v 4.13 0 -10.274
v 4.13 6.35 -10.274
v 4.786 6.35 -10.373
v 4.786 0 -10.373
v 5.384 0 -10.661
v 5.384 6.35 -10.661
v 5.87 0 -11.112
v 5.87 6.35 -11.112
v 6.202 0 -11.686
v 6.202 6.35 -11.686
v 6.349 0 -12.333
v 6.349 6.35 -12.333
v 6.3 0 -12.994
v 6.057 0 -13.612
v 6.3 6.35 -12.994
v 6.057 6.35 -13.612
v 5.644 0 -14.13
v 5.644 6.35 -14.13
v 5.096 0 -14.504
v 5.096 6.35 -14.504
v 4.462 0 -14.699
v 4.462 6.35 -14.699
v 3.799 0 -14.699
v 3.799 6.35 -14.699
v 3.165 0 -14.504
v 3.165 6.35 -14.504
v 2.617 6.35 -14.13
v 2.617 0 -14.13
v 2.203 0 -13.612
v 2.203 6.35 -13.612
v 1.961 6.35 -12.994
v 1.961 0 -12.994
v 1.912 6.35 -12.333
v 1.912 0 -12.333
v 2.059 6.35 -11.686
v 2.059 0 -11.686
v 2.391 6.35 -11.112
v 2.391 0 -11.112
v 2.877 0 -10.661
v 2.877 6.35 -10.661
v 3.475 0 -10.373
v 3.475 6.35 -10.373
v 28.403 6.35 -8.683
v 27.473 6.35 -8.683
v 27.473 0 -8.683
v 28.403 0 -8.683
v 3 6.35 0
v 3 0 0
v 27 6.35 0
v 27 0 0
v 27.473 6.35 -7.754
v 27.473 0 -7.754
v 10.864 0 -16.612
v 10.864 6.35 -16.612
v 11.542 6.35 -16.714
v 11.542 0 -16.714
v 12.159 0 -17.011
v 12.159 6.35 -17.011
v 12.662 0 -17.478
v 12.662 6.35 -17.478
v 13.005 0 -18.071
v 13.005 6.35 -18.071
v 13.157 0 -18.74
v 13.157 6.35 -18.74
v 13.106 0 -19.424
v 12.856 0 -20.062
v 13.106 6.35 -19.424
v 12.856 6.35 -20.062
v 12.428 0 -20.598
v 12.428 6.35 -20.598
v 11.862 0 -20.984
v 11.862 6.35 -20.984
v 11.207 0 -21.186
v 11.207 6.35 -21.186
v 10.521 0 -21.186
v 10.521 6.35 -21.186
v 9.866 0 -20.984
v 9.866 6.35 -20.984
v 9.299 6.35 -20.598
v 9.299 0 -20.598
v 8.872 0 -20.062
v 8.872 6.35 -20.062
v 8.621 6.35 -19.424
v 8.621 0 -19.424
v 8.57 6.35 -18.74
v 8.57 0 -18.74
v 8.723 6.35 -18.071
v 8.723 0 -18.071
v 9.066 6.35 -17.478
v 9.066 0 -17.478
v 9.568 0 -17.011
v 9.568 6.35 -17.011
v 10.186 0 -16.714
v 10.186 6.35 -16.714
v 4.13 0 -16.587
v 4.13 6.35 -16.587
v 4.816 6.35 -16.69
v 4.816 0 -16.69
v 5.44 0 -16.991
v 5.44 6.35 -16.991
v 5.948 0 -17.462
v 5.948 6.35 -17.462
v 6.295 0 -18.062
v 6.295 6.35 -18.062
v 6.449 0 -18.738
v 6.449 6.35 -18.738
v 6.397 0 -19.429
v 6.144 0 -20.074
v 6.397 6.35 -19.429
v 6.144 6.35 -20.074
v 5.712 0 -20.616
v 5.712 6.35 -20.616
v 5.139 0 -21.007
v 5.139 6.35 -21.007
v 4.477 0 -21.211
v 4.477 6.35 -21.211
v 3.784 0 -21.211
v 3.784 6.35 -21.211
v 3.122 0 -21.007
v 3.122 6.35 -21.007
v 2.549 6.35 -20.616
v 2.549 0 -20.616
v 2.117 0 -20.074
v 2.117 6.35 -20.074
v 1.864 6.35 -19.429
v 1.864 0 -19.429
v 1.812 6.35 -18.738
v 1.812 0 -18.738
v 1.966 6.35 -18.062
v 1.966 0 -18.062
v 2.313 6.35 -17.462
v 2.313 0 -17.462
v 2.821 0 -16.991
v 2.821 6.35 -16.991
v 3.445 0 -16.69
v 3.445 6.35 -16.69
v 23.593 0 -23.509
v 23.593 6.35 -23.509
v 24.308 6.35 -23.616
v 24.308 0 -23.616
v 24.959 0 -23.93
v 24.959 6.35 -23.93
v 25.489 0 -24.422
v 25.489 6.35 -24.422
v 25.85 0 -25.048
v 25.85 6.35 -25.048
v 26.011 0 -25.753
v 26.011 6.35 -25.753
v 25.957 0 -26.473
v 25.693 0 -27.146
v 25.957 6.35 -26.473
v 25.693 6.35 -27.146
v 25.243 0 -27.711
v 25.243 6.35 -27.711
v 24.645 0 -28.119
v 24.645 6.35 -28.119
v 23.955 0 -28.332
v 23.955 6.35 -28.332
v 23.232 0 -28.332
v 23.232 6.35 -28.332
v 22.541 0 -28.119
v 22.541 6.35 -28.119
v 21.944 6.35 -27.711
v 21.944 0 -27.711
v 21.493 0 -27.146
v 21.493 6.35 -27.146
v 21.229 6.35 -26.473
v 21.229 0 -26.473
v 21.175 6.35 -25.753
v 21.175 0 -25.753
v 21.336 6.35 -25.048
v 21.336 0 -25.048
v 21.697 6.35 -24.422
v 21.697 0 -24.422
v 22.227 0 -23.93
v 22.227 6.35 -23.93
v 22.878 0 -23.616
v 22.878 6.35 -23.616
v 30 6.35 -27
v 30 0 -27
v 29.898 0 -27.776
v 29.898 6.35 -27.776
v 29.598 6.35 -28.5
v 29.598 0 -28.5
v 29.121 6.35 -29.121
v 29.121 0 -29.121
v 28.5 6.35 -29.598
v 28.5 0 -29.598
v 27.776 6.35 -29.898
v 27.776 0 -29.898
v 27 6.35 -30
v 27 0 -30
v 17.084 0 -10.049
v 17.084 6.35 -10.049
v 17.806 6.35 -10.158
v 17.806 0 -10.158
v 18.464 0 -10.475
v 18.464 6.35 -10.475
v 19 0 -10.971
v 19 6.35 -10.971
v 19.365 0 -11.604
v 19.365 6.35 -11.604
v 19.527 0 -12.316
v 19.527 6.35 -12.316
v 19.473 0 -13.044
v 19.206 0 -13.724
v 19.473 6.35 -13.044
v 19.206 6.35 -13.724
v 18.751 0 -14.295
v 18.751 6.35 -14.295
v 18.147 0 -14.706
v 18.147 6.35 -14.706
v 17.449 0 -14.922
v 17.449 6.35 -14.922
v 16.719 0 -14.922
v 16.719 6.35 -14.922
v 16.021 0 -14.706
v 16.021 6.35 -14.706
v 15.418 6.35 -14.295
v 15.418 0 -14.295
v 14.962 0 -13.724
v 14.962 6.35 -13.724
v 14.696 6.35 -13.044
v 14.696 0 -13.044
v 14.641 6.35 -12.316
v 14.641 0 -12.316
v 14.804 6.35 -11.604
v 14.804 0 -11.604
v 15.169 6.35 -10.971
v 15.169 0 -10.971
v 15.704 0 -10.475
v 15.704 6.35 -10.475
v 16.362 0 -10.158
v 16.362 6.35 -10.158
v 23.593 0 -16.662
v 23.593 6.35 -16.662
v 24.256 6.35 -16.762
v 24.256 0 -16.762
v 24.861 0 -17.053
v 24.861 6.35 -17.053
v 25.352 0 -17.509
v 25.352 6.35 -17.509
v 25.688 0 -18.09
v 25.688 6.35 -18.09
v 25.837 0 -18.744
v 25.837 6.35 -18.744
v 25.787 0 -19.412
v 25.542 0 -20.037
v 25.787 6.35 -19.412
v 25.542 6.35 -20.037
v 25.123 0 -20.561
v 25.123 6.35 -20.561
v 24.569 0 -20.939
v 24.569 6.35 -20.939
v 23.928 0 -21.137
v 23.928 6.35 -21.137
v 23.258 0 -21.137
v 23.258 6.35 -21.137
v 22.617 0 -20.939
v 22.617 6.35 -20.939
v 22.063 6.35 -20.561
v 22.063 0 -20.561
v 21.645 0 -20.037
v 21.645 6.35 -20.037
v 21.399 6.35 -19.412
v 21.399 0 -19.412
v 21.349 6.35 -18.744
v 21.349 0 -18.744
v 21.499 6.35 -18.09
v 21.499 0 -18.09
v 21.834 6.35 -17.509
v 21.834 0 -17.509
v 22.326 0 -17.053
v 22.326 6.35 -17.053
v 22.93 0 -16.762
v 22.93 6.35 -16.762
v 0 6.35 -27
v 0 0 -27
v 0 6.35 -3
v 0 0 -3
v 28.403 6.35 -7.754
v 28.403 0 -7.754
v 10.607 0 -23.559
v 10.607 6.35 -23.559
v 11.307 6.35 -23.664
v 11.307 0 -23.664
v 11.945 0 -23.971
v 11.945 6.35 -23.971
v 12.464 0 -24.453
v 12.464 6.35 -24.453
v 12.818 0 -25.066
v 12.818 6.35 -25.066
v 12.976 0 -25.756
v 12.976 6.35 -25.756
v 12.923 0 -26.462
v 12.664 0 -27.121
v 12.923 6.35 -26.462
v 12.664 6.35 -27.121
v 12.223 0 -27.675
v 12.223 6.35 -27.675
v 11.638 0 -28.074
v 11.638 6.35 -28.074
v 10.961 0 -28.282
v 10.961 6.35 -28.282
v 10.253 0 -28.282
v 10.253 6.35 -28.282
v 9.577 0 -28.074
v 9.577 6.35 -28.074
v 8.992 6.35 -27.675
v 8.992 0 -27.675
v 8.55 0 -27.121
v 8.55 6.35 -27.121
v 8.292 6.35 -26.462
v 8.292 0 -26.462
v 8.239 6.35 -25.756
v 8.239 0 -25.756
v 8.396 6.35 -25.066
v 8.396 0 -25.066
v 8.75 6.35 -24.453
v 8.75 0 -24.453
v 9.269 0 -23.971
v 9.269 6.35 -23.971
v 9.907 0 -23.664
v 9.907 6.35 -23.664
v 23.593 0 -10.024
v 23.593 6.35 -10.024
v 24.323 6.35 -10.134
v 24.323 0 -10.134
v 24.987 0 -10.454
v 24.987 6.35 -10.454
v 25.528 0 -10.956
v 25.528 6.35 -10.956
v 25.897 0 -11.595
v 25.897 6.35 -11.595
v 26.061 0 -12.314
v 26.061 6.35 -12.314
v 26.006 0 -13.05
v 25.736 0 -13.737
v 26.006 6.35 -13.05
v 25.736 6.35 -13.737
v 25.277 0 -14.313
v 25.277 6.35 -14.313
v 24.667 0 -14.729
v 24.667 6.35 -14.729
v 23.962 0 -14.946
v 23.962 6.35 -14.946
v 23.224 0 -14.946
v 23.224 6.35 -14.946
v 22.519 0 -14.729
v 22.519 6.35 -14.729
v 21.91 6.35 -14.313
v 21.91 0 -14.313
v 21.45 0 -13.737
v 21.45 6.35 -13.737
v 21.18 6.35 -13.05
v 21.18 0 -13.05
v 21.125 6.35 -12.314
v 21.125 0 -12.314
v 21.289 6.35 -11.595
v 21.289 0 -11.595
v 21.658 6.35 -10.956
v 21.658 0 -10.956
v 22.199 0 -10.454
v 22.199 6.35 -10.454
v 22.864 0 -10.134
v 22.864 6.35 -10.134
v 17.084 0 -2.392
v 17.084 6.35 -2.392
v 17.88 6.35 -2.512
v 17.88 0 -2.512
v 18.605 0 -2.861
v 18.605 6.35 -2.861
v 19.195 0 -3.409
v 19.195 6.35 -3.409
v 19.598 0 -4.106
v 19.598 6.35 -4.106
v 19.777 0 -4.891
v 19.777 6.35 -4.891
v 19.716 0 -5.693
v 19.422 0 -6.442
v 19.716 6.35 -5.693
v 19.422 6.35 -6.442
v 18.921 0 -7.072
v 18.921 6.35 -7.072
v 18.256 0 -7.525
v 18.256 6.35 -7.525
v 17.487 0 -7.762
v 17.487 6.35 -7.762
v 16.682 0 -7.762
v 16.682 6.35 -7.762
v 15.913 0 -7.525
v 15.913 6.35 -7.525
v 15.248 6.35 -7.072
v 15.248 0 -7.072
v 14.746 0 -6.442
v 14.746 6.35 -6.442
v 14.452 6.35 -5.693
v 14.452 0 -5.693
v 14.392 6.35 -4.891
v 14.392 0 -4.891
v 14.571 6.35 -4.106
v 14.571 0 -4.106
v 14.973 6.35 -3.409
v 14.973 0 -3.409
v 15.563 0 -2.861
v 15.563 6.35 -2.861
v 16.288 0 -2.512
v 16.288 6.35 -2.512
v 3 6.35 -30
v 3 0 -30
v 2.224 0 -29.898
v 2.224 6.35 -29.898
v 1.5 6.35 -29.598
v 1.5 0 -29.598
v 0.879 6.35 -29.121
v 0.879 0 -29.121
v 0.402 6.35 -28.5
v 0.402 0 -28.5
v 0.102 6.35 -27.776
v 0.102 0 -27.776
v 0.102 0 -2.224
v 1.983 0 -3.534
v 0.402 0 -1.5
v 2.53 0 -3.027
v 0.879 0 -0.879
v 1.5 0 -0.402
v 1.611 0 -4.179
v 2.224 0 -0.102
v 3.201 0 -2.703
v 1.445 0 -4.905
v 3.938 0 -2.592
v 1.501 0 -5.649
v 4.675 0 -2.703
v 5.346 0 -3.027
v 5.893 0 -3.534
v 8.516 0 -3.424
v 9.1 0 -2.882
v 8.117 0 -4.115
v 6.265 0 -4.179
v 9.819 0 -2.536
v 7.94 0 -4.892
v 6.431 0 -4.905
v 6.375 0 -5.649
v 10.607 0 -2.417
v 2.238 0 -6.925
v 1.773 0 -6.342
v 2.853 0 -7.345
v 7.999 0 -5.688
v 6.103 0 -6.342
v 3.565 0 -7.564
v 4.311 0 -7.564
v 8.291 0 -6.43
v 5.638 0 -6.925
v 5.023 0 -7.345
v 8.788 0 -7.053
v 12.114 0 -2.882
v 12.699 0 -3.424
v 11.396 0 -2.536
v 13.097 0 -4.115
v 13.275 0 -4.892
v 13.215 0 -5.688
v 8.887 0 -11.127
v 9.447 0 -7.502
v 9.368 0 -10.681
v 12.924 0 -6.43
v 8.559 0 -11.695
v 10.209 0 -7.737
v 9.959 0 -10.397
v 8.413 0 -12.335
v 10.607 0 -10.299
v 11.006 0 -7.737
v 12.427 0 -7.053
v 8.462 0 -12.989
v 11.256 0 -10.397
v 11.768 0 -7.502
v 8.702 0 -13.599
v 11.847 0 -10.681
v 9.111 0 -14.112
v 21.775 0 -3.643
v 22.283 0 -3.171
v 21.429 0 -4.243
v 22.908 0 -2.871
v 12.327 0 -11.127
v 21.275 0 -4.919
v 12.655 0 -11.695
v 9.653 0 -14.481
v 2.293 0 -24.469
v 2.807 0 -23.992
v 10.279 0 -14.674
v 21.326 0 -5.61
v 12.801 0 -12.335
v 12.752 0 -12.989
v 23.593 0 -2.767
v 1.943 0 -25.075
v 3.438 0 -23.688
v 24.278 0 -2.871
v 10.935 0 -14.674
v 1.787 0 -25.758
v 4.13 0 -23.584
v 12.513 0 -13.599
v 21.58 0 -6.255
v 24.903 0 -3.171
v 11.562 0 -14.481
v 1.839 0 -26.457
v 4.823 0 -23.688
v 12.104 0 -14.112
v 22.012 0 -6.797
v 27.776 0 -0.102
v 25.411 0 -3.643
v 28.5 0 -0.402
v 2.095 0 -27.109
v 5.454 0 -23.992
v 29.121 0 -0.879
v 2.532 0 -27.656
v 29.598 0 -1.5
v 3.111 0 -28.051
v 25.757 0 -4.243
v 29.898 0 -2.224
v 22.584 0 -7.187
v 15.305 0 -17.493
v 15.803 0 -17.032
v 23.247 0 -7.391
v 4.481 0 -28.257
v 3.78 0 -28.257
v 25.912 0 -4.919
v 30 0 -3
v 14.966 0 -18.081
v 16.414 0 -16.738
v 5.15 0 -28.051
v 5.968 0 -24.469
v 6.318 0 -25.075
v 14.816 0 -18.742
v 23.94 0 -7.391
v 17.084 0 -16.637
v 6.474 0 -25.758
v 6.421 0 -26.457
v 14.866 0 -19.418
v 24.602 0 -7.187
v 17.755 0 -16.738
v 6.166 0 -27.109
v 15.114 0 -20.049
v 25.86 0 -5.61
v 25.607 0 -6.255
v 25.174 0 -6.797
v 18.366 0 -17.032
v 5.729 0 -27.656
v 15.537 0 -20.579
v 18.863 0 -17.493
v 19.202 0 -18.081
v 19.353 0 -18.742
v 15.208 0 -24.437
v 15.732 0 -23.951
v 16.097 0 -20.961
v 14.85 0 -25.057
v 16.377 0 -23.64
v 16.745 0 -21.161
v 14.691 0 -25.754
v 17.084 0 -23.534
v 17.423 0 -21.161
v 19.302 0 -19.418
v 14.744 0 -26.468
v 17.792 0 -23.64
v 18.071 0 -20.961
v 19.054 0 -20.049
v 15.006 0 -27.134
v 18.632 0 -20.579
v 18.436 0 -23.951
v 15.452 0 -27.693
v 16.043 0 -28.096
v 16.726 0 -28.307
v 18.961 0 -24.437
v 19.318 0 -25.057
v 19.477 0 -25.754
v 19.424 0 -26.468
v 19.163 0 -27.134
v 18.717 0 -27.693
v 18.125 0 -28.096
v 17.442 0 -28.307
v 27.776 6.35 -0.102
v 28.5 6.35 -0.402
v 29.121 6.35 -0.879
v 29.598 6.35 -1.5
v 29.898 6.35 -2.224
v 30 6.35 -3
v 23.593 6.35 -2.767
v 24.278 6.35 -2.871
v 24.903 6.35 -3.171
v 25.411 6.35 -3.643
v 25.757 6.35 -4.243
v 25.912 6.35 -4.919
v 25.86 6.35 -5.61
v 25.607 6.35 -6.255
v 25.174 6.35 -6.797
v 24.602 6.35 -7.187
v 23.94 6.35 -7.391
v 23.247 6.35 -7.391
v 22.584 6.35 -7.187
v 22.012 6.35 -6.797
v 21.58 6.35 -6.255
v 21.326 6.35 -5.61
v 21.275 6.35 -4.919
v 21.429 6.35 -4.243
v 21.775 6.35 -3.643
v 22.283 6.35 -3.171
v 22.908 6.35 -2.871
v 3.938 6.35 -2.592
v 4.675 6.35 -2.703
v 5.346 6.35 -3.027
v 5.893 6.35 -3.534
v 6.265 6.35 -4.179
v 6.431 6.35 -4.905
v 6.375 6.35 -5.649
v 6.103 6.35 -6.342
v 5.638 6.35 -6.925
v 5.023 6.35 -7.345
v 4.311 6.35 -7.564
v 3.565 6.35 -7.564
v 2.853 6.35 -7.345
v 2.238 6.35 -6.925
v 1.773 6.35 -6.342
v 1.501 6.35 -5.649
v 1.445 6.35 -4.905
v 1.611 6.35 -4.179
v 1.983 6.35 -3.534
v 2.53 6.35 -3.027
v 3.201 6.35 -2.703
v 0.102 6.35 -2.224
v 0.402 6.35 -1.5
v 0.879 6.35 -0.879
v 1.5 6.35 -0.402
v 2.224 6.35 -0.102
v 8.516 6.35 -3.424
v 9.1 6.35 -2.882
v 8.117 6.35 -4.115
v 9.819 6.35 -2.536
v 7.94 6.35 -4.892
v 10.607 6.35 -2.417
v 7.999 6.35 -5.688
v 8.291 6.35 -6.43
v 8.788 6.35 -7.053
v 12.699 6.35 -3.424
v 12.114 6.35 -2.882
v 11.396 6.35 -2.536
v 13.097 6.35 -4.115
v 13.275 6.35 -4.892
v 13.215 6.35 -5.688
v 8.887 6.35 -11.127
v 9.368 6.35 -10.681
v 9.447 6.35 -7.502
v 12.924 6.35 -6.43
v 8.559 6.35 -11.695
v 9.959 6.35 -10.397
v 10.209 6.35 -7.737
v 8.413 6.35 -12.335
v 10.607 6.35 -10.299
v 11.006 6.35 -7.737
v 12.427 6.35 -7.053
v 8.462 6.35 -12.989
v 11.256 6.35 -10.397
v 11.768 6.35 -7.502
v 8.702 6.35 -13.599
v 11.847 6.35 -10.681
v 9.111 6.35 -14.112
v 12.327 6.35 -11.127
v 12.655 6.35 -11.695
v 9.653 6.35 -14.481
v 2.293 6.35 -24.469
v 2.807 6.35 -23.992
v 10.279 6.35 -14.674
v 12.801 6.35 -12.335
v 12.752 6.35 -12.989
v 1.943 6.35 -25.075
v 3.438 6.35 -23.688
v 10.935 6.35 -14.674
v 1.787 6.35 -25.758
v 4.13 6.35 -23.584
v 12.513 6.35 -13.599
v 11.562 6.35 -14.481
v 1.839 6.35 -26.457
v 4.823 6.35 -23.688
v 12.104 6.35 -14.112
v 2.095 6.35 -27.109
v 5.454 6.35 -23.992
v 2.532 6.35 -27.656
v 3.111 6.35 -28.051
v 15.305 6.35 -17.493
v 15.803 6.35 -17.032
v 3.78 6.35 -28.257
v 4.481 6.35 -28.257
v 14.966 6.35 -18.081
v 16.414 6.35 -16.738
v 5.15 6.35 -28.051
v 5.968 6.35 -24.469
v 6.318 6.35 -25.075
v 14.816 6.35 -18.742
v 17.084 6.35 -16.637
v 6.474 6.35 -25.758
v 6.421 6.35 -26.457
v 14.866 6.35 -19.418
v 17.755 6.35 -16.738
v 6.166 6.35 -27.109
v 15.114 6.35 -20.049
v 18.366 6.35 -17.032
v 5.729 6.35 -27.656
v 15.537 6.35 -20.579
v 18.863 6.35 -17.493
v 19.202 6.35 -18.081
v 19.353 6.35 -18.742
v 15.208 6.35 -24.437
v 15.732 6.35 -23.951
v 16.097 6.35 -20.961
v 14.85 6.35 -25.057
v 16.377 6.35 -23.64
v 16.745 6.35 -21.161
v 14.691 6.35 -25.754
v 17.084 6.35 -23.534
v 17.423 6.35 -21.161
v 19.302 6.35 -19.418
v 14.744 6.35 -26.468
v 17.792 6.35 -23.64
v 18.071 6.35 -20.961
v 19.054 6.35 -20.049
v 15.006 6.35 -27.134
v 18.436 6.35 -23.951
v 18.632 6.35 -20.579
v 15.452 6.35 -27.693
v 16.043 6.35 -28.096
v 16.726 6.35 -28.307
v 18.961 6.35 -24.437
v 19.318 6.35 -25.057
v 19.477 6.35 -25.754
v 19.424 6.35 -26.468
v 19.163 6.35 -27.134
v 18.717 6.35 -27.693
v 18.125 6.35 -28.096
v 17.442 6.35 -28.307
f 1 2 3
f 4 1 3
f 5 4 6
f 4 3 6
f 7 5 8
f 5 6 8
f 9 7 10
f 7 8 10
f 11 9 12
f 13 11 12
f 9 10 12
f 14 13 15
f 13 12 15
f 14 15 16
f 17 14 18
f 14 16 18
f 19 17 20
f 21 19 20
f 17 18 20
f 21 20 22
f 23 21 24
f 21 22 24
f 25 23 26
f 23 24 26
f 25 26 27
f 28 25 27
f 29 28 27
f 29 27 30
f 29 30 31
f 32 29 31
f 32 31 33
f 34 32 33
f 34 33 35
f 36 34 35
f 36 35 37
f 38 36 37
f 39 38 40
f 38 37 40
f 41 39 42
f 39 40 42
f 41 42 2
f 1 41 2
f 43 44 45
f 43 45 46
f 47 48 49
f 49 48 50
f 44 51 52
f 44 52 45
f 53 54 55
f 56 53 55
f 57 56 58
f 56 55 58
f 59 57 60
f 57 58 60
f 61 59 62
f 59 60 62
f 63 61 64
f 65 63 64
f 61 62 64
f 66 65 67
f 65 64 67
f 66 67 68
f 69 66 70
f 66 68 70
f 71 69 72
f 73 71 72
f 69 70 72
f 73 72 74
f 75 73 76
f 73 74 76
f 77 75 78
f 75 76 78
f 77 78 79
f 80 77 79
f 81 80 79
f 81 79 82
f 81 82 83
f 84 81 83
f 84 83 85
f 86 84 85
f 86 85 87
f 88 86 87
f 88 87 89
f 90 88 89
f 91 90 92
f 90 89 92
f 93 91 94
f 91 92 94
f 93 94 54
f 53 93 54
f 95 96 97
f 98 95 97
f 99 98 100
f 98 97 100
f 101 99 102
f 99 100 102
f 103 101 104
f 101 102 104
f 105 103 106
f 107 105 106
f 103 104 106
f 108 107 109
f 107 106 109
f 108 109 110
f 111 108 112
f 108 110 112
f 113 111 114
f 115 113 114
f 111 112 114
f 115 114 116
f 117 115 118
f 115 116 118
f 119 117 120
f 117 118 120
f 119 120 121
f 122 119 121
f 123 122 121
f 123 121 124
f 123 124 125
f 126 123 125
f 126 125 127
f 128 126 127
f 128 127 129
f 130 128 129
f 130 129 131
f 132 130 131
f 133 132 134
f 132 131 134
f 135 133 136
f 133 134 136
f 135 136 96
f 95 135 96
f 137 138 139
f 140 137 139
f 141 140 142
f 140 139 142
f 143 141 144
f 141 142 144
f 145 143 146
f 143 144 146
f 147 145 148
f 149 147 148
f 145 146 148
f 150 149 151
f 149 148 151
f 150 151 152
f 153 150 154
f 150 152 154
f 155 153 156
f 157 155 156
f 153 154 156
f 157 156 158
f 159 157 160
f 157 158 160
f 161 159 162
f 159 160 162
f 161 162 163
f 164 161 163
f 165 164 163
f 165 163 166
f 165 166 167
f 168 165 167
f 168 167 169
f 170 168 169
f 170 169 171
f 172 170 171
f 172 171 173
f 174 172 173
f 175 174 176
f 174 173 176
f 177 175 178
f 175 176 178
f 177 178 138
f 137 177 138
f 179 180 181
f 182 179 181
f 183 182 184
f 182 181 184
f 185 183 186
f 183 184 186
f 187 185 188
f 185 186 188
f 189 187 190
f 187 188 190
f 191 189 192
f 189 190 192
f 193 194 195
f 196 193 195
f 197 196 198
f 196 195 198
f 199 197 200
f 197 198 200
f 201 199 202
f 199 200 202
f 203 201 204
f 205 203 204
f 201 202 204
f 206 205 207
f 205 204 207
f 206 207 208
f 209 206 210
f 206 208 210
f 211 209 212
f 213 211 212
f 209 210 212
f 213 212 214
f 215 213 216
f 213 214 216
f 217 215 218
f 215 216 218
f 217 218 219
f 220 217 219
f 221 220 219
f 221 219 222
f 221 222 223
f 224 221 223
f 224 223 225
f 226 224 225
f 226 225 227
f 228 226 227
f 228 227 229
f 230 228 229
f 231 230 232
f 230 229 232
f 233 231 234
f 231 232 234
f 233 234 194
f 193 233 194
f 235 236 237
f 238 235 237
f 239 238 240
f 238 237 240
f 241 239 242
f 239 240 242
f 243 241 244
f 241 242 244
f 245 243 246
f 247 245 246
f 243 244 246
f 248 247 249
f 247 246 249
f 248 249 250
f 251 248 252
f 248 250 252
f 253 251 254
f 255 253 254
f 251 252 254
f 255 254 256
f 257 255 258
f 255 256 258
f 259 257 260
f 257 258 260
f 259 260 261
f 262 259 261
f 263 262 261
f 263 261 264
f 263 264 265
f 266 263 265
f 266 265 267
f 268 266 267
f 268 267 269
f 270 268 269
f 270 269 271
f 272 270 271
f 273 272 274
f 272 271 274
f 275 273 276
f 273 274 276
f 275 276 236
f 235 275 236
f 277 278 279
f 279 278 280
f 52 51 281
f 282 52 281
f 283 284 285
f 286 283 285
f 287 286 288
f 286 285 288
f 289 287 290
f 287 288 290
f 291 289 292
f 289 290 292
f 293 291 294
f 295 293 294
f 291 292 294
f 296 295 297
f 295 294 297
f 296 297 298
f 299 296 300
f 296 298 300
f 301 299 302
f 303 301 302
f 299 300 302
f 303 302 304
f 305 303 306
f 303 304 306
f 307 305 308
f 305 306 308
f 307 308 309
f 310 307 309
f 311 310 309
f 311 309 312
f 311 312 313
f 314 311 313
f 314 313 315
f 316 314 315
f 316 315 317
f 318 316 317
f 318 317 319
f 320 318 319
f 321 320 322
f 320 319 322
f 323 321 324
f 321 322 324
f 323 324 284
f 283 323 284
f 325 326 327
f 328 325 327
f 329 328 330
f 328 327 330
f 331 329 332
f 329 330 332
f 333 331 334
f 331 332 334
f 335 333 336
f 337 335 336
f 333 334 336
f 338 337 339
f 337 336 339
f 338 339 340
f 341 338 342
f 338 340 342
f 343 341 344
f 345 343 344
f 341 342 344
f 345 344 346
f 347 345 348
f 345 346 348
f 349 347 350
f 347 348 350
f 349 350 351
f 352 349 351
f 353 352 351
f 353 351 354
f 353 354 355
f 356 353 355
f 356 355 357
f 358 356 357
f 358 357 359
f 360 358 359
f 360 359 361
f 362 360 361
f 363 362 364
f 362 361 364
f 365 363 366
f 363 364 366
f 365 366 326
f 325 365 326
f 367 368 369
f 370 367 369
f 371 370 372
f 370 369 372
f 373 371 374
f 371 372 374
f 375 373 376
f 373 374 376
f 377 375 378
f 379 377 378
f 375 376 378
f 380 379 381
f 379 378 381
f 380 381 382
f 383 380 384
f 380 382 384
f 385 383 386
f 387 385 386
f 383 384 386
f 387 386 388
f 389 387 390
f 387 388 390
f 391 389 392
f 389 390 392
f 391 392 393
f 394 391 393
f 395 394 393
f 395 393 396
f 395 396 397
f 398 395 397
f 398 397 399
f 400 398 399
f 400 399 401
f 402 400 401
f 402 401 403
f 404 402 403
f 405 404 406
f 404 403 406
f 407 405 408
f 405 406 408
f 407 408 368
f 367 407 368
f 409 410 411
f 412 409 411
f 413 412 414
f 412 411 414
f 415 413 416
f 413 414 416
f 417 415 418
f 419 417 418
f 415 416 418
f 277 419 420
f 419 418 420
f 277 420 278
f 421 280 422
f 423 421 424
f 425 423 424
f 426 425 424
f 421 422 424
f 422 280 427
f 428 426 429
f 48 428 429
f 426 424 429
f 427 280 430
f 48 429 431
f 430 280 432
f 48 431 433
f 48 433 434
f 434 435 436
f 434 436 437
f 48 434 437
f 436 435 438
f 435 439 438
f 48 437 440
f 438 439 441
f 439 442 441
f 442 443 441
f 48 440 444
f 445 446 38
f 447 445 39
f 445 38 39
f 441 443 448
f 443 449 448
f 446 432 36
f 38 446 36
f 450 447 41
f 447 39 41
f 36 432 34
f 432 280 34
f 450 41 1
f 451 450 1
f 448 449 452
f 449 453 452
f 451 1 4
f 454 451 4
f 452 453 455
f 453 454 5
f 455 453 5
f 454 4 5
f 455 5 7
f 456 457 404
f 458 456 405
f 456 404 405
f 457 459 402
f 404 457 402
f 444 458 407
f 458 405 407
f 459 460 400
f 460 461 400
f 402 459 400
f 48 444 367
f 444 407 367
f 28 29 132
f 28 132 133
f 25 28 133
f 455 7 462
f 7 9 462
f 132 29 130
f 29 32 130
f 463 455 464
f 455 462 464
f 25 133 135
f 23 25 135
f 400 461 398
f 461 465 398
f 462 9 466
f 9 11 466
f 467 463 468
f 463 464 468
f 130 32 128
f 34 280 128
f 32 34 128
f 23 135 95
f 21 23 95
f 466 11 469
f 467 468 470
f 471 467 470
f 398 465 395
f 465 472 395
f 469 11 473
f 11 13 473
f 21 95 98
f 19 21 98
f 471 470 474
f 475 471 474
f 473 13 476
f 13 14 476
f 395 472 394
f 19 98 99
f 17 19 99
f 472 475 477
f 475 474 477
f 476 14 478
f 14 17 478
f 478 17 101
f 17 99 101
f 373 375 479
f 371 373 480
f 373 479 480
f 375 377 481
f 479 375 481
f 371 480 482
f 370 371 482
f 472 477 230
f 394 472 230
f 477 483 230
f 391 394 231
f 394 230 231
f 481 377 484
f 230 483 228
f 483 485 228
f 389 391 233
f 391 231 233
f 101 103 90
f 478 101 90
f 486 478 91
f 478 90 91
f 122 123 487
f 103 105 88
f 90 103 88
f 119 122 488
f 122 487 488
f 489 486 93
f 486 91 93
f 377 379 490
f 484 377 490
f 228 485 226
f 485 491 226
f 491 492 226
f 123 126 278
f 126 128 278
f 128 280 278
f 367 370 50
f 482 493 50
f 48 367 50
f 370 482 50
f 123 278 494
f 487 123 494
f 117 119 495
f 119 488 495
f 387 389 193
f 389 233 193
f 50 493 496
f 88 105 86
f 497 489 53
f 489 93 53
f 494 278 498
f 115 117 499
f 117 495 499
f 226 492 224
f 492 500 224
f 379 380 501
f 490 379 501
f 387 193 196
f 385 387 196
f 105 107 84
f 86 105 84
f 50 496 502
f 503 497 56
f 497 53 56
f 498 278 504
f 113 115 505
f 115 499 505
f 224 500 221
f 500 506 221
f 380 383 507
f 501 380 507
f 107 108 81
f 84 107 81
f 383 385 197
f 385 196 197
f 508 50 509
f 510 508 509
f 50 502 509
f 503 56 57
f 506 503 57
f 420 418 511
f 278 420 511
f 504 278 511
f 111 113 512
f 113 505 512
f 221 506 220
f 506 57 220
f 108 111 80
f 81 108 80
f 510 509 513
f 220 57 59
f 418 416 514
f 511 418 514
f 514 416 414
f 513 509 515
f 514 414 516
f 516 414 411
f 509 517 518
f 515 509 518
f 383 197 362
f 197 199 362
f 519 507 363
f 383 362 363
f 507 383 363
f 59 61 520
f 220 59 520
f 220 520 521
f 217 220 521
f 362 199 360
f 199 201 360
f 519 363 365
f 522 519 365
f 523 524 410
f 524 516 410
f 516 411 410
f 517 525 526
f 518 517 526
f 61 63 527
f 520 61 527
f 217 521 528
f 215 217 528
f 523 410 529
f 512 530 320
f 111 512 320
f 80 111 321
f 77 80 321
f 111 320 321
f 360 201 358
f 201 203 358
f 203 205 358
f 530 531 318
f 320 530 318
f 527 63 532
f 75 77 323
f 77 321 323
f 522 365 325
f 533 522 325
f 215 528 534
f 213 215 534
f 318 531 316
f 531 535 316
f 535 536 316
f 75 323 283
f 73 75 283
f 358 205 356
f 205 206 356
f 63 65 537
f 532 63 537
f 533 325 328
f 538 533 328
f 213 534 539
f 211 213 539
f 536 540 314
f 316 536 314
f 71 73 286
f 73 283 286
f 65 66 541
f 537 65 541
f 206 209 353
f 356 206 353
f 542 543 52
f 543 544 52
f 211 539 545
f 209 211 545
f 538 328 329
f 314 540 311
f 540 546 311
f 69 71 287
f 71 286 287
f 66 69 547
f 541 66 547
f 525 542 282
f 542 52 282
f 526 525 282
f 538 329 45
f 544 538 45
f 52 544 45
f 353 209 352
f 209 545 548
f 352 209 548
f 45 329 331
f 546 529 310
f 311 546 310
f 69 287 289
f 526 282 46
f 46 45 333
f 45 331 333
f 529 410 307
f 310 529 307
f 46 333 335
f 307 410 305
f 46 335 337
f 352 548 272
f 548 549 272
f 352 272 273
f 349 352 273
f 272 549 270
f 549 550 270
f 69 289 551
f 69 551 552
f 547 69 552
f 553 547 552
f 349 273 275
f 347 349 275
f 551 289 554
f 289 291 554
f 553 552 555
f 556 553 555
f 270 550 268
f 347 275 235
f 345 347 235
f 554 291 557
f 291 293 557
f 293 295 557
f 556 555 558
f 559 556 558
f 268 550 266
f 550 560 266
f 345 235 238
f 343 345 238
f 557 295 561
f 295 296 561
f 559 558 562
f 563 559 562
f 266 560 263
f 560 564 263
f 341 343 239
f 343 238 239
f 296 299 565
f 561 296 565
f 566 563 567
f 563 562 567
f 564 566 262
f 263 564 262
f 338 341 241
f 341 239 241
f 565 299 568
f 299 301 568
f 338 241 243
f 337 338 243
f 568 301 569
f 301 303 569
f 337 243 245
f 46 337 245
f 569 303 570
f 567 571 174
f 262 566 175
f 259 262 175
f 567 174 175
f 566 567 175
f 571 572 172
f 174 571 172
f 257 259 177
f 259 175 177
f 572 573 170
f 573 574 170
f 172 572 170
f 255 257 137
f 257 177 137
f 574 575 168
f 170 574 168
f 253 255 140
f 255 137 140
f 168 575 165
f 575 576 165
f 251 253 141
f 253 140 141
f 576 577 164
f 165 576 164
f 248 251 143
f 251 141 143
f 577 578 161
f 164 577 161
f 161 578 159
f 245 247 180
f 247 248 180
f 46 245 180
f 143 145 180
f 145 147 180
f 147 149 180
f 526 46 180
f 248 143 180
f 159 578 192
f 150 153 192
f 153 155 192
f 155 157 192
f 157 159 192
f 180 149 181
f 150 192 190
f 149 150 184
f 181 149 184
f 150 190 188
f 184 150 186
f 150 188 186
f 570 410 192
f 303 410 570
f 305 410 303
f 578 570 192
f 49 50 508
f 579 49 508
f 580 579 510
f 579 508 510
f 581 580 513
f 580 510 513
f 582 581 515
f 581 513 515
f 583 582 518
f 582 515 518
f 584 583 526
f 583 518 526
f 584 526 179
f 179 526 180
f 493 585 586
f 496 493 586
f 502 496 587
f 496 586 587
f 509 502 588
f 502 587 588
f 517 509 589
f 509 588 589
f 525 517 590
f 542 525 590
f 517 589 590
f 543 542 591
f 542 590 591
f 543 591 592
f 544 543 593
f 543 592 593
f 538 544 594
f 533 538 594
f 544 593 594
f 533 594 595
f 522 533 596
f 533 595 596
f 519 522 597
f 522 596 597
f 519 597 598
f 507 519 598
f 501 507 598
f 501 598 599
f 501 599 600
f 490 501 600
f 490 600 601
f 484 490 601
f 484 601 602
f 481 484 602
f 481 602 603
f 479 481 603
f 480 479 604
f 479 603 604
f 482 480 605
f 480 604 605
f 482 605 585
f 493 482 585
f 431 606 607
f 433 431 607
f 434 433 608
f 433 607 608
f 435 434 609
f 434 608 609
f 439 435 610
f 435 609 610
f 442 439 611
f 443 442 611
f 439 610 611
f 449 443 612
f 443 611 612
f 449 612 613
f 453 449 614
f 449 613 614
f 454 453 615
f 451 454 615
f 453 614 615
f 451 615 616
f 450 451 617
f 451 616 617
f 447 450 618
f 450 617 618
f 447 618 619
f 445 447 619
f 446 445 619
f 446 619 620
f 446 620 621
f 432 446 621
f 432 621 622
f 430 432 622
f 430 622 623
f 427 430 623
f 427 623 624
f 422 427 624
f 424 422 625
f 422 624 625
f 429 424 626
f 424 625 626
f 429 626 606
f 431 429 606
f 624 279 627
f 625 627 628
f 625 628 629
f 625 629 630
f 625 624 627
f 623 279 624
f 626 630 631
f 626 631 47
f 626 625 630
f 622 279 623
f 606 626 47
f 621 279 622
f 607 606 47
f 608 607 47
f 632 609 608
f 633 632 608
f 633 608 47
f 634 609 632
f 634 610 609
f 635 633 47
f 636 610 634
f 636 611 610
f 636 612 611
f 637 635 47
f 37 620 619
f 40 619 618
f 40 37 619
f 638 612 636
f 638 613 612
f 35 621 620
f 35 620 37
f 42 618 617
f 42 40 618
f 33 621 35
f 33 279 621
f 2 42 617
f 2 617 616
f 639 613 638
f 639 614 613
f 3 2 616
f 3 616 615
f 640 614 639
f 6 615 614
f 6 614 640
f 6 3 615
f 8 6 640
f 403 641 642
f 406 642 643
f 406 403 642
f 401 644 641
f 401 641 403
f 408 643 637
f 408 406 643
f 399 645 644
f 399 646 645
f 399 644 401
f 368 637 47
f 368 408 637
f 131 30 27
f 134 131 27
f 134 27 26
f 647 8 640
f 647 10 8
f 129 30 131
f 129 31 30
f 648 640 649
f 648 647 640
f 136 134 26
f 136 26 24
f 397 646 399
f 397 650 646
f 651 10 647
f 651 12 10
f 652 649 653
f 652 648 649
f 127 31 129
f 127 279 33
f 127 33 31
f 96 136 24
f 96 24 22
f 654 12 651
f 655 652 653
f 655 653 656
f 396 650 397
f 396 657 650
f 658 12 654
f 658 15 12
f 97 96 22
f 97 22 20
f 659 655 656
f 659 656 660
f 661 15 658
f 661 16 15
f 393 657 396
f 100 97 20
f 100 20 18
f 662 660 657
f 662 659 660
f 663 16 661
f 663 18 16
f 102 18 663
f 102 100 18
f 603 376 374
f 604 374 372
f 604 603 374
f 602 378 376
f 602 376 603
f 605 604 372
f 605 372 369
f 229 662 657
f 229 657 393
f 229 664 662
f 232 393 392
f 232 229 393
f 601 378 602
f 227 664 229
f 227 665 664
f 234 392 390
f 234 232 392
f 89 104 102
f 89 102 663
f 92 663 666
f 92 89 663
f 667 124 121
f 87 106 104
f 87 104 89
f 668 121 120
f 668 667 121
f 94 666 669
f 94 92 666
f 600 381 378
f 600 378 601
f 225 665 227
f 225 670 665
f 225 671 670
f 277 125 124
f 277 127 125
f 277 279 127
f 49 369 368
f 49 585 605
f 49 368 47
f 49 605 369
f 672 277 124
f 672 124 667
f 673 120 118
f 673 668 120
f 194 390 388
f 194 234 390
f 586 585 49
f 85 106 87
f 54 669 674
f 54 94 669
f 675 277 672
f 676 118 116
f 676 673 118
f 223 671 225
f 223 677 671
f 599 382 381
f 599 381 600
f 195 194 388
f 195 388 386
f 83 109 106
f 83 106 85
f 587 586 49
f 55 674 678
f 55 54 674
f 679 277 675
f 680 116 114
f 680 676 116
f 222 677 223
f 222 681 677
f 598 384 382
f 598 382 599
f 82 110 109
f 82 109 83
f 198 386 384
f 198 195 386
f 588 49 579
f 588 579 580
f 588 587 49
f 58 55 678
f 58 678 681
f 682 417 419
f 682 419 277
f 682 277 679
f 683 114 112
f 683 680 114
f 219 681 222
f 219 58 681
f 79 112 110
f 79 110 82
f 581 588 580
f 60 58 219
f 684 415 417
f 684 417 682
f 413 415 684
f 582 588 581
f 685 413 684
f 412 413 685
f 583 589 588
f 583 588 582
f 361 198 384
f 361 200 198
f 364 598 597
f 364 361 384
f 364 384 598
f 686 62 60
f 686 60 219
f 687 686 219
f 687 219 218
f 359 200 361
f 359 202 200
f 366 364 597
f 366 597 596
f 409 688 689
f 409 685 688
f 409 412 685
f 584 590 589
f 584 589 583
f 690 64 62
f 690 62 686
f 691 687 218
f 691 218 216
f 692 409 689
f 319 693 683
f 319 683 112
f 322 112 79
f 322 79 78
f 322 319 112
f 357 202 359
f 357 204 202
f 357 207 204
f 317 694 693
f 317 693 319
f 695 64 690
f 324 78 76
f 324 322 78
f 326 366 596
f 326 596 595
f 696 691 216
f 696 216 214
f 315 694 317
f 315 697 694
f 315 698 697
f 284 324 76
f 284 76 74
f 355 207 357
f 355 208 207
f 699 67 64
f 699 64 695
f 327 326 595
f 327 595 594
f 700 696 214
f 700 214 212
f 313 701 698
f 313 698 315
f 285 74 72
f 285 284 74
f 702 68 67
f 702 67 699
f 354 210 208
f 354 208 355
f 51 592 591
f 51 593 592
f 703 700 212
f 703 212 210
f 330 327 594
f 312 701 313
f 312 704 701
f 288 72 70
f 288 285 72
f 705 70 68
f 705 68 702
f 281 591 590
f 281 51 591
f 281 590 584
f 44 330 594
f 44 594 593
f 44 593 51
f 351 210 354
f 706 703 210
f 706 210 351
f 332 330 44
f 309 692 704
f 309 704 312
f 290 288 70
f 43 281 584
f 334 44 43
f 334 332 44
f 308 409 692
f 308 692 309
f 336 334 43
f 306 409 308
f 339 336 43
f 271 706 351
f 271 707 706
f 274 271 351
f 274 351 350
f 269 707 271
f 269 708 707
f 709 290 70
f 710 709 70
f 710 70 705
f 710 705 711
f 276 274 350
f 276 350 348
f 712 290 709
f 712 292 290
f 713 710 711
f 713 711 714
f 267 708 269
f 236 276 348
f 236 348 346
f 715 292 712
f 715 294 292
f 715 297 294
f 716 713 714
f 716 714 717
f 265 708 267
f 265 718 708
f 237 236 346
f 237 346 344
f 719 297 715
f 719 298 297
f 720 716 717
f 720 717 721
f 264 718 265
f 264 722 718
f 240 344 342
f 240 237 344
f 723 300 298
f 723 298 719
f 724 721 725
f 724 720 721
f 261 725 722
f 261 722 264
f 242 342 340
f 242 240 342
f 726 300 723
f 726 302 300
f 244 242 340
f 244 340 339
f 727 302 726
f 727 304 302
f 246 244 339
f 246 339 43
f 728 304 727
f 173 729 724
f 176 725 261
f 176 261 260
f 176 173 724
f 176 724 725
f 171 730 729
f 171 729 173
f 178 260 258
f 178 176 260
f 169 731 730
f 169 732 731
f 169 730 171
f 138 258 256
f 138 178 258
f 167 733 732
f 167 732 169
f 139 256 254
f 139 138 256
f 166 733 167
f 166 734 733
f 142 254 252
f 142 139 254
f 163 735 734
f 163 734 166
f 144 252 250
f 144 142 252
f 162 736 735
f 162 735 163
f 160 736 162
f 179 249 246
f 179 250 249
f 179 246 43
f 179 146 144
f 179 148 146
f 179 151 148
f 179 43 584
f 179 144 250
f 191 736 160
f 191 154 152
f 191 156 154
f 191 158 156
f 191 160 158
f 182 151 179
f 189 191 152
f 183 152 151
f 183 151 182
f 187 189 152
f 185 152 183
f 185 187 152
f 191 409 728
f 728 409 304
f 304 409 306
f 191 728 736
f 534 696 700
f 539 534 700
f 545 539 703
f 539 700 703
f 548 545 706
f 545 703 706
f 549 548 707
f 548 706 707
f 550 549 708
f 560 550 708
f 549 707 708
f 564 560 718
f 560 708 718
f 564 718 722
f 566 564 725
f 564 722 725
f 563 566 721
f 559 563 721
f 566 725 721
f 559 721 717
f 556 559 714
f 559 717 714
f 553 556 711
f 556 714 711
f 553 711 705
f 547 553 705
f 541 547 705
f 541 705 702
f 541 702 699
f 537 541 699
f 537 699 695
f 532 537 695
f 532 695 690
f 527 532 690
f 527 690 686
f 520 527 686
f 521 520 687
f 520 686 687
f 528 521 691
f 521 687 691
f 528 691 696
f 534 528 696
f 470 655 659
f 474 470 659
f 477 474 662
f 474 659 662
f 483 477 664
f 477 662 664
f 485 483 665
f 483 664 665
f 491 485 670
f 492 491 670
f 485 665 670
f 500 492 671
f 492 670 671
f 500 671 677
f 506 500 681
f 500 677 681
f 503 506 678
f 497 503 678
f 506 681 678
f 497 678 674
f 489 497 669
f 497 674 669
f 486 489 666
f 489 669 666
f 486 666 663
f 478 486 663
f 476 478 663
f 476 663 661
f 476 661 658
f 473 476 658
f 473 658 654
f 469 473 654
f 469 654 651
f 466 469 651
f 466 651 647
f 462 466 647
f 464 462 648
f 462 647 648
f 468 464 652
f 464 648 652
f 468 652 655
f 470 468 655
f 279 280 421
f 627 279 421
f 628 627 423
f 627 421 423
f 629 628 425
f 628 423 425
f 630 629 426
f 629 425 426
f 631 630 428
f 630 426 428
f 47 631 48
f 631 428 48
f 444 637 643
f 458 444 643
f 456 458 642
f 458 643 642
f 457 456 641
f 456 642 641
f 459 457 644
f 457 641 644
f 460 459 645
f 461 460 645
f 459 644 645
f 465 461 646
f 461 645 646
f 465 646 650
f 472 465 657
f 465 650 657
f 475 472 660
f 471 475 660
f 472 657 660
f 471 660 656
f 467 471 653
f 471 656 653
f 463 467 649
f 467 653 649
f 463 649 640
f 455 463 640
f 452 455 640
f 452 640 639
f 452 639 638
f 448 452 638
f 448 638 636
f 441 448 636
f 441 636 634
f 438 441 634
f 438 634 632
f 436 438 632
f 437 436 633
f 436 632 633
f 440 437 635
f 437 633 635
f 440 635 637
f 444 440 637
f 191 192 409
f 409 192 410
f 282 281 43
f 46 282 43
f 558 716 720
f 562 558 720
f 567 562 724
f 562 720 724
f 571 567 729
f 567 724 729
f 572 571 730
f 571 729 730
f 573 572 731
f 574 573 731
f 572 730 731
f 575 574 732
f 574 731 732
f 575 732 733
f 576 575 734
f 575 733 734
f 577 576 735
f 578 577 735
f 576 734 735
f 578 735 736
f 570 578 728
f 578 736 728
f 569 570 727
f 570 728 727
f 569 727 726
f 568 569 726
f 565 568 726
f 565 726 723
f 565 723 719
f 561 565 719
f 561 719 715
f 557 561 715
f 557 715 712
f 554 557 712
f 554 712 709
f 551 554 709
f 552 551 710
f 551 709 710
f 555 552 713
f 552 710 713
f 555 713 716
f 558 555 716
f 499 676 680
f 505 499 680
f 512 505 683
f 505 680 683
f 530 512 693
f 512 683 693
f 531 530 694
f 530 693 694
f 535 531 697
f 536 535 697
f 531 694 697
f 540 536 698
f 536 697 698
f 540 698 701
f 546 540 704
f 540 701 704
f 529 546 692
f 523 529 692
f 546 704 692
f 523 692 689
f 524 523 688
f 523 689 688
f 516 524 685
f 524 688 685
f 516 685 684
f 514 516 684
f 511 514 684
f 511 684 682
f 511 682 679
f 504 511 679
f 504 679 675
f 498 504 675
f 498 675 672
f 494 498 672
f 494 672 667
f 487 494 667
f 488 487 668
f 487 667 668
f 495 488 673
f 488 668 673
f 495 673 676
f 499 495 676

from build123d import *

# Parameters (mm, degrees)
BOSS_EXTRUDE1_DEPTH = 6.35
SKETCH2_R           = 2.35
SKETCH2_R_2         = 2.4
SKETCH2_R_3         = 2.325
SKETCH2_R_4         = 2.275
SKETCH2_R_5         = 2.375
SKETCH2_R_6         = 2.425
SKETCH2_R_7         = 2.3
SKETCH2_R_8         = 2.25
SKETCH2_R_9         = 2.225
SKETCH2_R_10        = 2.2
SKETCH2_R_11        = 2.45
SKETCH2_R_12        = 2.475
SKETCH2_R_13        = 2.5
SKETCH2_R_14        = 2.675
SKETCH2_R_15        = 2.7
SKETCH2_W           = 0.929848637
SKETCH2_H           = 0.929848637
CUT_EXTRUDE1_DEPTH  = 6.35


with BuildPart() as part:
    # Sketch1 → Boss-Extrude1 (new body)
    with BuildSketch(Plane(origin=(0, 0, 0), x_dir=(1, 0, 0), z_dir=(0, 1, 0))):
        with BuildLine():
            Line((3, 0), (27, 0))
            ThreePointArc((27, 0), (29.121320344, 0.878679656), (30, 3))
            Line((30, 3), (30, 27))
            ThreePointArc((30, 27), (29.121320344, 29.121320344), (27, 30))
            Line((27, 30), (3, 30))
            ThreePointArc((3, 30), (0.878679656, 29.121320344), (0, 27))
            Line((0, 27), (0, 3))
            ThreePointArc((0, 3), (0.878679656, 0.878679656), (3, 0))
        make_face()
    extrude(amount=BOSS_EXTRUDE1_DEPTH)

    # Sketch2 → Cut-Extrude1 (cut)
    with BuildSketch(Plane(origin=(0, 6.35, 0), x_dir=(1, 0, 0), z_dir=(0, 1, 0))):
        with Locations(Location((4.130390075, 25.933737418, 0), (0, 0, 270))):
            Circle(SKETCH2_R)
        with Locations(Location((17.084143496, 25.933737418, 0), (0, 0, 270))):
            Circle(SKETCH2_R_2)
        with Locations(Location((4.130390075, 18.911777023, 0), (0, 0, 270))):
            Circle(SKETCH2_R_3)
        with Locations(Location((17.084143496, 18.911777023, 0), (0, 0, 270))):
            Circle(SKETCH2_R_4)
        with Locations(Location((10.607266785, 25.933737418, 0), (0, 0, 270))):
            Circle(SKETCH2_R_5)
        with Locations(Location((23.593083953, 25.933737418, 0), (0, 0, 270))):
            Circle(SKETCH2_R_6)
        with Locations(Location((10.863776754, 18.911777023, 0), (0, 0, 270))):
            Circle(SKETCH2_R_7)
        with Locations(Location((23.593083953, 18.911777023, 0), (0, 0, 270))):
            Circle(SKETCH2_R_8)
        with Locations(Location((4.130390075, 12.499027805, 0), (0, 0, 270))):
            Circle(SKETCH2_R_9)
        with Locations(Location((10.607266785, 12.499027805, 0), (0, 0, 270))):
            Circle(SKETCH2_R_10)
        with Locations(Location((17.084143496, 12.499027805, 0), (0, 0, 270))):
            Circle(SKETCH2_R_11)
        with Locations(Location((23.593083953, 12.499027805, 0), (0, 0, 270))):
            Circle(SKETCH2_R_12)
        with Locations(Location((3.938007598, 5.092302457, 0), (0, 0, 270))):
            Circle(SKETCH2_R_13)
        with Locations(Location((10.607266785, 5.092302457, 0), (0, 0, 270))):
            Circle(SKETCH2_R_14)
        with Locations(Location((17.084143496, 5.092302457, 0), (0, 0, 270))):
            Circle(SKETCH2_R_15)
        with Locations(Location((23.593083953, 5.092302457, 0), (0, 0, 270))):
            Circle(SKETCH2_R_3)
        with Locations((27.937721549, 8.218517702)):
            Rectangle(SKETCH2_W, SKETCH2_H)
    extrude(amount=-CUT_EXTRUDE1_DEPTH, mode=Mode.SUBTRACT)


solid = part.part
